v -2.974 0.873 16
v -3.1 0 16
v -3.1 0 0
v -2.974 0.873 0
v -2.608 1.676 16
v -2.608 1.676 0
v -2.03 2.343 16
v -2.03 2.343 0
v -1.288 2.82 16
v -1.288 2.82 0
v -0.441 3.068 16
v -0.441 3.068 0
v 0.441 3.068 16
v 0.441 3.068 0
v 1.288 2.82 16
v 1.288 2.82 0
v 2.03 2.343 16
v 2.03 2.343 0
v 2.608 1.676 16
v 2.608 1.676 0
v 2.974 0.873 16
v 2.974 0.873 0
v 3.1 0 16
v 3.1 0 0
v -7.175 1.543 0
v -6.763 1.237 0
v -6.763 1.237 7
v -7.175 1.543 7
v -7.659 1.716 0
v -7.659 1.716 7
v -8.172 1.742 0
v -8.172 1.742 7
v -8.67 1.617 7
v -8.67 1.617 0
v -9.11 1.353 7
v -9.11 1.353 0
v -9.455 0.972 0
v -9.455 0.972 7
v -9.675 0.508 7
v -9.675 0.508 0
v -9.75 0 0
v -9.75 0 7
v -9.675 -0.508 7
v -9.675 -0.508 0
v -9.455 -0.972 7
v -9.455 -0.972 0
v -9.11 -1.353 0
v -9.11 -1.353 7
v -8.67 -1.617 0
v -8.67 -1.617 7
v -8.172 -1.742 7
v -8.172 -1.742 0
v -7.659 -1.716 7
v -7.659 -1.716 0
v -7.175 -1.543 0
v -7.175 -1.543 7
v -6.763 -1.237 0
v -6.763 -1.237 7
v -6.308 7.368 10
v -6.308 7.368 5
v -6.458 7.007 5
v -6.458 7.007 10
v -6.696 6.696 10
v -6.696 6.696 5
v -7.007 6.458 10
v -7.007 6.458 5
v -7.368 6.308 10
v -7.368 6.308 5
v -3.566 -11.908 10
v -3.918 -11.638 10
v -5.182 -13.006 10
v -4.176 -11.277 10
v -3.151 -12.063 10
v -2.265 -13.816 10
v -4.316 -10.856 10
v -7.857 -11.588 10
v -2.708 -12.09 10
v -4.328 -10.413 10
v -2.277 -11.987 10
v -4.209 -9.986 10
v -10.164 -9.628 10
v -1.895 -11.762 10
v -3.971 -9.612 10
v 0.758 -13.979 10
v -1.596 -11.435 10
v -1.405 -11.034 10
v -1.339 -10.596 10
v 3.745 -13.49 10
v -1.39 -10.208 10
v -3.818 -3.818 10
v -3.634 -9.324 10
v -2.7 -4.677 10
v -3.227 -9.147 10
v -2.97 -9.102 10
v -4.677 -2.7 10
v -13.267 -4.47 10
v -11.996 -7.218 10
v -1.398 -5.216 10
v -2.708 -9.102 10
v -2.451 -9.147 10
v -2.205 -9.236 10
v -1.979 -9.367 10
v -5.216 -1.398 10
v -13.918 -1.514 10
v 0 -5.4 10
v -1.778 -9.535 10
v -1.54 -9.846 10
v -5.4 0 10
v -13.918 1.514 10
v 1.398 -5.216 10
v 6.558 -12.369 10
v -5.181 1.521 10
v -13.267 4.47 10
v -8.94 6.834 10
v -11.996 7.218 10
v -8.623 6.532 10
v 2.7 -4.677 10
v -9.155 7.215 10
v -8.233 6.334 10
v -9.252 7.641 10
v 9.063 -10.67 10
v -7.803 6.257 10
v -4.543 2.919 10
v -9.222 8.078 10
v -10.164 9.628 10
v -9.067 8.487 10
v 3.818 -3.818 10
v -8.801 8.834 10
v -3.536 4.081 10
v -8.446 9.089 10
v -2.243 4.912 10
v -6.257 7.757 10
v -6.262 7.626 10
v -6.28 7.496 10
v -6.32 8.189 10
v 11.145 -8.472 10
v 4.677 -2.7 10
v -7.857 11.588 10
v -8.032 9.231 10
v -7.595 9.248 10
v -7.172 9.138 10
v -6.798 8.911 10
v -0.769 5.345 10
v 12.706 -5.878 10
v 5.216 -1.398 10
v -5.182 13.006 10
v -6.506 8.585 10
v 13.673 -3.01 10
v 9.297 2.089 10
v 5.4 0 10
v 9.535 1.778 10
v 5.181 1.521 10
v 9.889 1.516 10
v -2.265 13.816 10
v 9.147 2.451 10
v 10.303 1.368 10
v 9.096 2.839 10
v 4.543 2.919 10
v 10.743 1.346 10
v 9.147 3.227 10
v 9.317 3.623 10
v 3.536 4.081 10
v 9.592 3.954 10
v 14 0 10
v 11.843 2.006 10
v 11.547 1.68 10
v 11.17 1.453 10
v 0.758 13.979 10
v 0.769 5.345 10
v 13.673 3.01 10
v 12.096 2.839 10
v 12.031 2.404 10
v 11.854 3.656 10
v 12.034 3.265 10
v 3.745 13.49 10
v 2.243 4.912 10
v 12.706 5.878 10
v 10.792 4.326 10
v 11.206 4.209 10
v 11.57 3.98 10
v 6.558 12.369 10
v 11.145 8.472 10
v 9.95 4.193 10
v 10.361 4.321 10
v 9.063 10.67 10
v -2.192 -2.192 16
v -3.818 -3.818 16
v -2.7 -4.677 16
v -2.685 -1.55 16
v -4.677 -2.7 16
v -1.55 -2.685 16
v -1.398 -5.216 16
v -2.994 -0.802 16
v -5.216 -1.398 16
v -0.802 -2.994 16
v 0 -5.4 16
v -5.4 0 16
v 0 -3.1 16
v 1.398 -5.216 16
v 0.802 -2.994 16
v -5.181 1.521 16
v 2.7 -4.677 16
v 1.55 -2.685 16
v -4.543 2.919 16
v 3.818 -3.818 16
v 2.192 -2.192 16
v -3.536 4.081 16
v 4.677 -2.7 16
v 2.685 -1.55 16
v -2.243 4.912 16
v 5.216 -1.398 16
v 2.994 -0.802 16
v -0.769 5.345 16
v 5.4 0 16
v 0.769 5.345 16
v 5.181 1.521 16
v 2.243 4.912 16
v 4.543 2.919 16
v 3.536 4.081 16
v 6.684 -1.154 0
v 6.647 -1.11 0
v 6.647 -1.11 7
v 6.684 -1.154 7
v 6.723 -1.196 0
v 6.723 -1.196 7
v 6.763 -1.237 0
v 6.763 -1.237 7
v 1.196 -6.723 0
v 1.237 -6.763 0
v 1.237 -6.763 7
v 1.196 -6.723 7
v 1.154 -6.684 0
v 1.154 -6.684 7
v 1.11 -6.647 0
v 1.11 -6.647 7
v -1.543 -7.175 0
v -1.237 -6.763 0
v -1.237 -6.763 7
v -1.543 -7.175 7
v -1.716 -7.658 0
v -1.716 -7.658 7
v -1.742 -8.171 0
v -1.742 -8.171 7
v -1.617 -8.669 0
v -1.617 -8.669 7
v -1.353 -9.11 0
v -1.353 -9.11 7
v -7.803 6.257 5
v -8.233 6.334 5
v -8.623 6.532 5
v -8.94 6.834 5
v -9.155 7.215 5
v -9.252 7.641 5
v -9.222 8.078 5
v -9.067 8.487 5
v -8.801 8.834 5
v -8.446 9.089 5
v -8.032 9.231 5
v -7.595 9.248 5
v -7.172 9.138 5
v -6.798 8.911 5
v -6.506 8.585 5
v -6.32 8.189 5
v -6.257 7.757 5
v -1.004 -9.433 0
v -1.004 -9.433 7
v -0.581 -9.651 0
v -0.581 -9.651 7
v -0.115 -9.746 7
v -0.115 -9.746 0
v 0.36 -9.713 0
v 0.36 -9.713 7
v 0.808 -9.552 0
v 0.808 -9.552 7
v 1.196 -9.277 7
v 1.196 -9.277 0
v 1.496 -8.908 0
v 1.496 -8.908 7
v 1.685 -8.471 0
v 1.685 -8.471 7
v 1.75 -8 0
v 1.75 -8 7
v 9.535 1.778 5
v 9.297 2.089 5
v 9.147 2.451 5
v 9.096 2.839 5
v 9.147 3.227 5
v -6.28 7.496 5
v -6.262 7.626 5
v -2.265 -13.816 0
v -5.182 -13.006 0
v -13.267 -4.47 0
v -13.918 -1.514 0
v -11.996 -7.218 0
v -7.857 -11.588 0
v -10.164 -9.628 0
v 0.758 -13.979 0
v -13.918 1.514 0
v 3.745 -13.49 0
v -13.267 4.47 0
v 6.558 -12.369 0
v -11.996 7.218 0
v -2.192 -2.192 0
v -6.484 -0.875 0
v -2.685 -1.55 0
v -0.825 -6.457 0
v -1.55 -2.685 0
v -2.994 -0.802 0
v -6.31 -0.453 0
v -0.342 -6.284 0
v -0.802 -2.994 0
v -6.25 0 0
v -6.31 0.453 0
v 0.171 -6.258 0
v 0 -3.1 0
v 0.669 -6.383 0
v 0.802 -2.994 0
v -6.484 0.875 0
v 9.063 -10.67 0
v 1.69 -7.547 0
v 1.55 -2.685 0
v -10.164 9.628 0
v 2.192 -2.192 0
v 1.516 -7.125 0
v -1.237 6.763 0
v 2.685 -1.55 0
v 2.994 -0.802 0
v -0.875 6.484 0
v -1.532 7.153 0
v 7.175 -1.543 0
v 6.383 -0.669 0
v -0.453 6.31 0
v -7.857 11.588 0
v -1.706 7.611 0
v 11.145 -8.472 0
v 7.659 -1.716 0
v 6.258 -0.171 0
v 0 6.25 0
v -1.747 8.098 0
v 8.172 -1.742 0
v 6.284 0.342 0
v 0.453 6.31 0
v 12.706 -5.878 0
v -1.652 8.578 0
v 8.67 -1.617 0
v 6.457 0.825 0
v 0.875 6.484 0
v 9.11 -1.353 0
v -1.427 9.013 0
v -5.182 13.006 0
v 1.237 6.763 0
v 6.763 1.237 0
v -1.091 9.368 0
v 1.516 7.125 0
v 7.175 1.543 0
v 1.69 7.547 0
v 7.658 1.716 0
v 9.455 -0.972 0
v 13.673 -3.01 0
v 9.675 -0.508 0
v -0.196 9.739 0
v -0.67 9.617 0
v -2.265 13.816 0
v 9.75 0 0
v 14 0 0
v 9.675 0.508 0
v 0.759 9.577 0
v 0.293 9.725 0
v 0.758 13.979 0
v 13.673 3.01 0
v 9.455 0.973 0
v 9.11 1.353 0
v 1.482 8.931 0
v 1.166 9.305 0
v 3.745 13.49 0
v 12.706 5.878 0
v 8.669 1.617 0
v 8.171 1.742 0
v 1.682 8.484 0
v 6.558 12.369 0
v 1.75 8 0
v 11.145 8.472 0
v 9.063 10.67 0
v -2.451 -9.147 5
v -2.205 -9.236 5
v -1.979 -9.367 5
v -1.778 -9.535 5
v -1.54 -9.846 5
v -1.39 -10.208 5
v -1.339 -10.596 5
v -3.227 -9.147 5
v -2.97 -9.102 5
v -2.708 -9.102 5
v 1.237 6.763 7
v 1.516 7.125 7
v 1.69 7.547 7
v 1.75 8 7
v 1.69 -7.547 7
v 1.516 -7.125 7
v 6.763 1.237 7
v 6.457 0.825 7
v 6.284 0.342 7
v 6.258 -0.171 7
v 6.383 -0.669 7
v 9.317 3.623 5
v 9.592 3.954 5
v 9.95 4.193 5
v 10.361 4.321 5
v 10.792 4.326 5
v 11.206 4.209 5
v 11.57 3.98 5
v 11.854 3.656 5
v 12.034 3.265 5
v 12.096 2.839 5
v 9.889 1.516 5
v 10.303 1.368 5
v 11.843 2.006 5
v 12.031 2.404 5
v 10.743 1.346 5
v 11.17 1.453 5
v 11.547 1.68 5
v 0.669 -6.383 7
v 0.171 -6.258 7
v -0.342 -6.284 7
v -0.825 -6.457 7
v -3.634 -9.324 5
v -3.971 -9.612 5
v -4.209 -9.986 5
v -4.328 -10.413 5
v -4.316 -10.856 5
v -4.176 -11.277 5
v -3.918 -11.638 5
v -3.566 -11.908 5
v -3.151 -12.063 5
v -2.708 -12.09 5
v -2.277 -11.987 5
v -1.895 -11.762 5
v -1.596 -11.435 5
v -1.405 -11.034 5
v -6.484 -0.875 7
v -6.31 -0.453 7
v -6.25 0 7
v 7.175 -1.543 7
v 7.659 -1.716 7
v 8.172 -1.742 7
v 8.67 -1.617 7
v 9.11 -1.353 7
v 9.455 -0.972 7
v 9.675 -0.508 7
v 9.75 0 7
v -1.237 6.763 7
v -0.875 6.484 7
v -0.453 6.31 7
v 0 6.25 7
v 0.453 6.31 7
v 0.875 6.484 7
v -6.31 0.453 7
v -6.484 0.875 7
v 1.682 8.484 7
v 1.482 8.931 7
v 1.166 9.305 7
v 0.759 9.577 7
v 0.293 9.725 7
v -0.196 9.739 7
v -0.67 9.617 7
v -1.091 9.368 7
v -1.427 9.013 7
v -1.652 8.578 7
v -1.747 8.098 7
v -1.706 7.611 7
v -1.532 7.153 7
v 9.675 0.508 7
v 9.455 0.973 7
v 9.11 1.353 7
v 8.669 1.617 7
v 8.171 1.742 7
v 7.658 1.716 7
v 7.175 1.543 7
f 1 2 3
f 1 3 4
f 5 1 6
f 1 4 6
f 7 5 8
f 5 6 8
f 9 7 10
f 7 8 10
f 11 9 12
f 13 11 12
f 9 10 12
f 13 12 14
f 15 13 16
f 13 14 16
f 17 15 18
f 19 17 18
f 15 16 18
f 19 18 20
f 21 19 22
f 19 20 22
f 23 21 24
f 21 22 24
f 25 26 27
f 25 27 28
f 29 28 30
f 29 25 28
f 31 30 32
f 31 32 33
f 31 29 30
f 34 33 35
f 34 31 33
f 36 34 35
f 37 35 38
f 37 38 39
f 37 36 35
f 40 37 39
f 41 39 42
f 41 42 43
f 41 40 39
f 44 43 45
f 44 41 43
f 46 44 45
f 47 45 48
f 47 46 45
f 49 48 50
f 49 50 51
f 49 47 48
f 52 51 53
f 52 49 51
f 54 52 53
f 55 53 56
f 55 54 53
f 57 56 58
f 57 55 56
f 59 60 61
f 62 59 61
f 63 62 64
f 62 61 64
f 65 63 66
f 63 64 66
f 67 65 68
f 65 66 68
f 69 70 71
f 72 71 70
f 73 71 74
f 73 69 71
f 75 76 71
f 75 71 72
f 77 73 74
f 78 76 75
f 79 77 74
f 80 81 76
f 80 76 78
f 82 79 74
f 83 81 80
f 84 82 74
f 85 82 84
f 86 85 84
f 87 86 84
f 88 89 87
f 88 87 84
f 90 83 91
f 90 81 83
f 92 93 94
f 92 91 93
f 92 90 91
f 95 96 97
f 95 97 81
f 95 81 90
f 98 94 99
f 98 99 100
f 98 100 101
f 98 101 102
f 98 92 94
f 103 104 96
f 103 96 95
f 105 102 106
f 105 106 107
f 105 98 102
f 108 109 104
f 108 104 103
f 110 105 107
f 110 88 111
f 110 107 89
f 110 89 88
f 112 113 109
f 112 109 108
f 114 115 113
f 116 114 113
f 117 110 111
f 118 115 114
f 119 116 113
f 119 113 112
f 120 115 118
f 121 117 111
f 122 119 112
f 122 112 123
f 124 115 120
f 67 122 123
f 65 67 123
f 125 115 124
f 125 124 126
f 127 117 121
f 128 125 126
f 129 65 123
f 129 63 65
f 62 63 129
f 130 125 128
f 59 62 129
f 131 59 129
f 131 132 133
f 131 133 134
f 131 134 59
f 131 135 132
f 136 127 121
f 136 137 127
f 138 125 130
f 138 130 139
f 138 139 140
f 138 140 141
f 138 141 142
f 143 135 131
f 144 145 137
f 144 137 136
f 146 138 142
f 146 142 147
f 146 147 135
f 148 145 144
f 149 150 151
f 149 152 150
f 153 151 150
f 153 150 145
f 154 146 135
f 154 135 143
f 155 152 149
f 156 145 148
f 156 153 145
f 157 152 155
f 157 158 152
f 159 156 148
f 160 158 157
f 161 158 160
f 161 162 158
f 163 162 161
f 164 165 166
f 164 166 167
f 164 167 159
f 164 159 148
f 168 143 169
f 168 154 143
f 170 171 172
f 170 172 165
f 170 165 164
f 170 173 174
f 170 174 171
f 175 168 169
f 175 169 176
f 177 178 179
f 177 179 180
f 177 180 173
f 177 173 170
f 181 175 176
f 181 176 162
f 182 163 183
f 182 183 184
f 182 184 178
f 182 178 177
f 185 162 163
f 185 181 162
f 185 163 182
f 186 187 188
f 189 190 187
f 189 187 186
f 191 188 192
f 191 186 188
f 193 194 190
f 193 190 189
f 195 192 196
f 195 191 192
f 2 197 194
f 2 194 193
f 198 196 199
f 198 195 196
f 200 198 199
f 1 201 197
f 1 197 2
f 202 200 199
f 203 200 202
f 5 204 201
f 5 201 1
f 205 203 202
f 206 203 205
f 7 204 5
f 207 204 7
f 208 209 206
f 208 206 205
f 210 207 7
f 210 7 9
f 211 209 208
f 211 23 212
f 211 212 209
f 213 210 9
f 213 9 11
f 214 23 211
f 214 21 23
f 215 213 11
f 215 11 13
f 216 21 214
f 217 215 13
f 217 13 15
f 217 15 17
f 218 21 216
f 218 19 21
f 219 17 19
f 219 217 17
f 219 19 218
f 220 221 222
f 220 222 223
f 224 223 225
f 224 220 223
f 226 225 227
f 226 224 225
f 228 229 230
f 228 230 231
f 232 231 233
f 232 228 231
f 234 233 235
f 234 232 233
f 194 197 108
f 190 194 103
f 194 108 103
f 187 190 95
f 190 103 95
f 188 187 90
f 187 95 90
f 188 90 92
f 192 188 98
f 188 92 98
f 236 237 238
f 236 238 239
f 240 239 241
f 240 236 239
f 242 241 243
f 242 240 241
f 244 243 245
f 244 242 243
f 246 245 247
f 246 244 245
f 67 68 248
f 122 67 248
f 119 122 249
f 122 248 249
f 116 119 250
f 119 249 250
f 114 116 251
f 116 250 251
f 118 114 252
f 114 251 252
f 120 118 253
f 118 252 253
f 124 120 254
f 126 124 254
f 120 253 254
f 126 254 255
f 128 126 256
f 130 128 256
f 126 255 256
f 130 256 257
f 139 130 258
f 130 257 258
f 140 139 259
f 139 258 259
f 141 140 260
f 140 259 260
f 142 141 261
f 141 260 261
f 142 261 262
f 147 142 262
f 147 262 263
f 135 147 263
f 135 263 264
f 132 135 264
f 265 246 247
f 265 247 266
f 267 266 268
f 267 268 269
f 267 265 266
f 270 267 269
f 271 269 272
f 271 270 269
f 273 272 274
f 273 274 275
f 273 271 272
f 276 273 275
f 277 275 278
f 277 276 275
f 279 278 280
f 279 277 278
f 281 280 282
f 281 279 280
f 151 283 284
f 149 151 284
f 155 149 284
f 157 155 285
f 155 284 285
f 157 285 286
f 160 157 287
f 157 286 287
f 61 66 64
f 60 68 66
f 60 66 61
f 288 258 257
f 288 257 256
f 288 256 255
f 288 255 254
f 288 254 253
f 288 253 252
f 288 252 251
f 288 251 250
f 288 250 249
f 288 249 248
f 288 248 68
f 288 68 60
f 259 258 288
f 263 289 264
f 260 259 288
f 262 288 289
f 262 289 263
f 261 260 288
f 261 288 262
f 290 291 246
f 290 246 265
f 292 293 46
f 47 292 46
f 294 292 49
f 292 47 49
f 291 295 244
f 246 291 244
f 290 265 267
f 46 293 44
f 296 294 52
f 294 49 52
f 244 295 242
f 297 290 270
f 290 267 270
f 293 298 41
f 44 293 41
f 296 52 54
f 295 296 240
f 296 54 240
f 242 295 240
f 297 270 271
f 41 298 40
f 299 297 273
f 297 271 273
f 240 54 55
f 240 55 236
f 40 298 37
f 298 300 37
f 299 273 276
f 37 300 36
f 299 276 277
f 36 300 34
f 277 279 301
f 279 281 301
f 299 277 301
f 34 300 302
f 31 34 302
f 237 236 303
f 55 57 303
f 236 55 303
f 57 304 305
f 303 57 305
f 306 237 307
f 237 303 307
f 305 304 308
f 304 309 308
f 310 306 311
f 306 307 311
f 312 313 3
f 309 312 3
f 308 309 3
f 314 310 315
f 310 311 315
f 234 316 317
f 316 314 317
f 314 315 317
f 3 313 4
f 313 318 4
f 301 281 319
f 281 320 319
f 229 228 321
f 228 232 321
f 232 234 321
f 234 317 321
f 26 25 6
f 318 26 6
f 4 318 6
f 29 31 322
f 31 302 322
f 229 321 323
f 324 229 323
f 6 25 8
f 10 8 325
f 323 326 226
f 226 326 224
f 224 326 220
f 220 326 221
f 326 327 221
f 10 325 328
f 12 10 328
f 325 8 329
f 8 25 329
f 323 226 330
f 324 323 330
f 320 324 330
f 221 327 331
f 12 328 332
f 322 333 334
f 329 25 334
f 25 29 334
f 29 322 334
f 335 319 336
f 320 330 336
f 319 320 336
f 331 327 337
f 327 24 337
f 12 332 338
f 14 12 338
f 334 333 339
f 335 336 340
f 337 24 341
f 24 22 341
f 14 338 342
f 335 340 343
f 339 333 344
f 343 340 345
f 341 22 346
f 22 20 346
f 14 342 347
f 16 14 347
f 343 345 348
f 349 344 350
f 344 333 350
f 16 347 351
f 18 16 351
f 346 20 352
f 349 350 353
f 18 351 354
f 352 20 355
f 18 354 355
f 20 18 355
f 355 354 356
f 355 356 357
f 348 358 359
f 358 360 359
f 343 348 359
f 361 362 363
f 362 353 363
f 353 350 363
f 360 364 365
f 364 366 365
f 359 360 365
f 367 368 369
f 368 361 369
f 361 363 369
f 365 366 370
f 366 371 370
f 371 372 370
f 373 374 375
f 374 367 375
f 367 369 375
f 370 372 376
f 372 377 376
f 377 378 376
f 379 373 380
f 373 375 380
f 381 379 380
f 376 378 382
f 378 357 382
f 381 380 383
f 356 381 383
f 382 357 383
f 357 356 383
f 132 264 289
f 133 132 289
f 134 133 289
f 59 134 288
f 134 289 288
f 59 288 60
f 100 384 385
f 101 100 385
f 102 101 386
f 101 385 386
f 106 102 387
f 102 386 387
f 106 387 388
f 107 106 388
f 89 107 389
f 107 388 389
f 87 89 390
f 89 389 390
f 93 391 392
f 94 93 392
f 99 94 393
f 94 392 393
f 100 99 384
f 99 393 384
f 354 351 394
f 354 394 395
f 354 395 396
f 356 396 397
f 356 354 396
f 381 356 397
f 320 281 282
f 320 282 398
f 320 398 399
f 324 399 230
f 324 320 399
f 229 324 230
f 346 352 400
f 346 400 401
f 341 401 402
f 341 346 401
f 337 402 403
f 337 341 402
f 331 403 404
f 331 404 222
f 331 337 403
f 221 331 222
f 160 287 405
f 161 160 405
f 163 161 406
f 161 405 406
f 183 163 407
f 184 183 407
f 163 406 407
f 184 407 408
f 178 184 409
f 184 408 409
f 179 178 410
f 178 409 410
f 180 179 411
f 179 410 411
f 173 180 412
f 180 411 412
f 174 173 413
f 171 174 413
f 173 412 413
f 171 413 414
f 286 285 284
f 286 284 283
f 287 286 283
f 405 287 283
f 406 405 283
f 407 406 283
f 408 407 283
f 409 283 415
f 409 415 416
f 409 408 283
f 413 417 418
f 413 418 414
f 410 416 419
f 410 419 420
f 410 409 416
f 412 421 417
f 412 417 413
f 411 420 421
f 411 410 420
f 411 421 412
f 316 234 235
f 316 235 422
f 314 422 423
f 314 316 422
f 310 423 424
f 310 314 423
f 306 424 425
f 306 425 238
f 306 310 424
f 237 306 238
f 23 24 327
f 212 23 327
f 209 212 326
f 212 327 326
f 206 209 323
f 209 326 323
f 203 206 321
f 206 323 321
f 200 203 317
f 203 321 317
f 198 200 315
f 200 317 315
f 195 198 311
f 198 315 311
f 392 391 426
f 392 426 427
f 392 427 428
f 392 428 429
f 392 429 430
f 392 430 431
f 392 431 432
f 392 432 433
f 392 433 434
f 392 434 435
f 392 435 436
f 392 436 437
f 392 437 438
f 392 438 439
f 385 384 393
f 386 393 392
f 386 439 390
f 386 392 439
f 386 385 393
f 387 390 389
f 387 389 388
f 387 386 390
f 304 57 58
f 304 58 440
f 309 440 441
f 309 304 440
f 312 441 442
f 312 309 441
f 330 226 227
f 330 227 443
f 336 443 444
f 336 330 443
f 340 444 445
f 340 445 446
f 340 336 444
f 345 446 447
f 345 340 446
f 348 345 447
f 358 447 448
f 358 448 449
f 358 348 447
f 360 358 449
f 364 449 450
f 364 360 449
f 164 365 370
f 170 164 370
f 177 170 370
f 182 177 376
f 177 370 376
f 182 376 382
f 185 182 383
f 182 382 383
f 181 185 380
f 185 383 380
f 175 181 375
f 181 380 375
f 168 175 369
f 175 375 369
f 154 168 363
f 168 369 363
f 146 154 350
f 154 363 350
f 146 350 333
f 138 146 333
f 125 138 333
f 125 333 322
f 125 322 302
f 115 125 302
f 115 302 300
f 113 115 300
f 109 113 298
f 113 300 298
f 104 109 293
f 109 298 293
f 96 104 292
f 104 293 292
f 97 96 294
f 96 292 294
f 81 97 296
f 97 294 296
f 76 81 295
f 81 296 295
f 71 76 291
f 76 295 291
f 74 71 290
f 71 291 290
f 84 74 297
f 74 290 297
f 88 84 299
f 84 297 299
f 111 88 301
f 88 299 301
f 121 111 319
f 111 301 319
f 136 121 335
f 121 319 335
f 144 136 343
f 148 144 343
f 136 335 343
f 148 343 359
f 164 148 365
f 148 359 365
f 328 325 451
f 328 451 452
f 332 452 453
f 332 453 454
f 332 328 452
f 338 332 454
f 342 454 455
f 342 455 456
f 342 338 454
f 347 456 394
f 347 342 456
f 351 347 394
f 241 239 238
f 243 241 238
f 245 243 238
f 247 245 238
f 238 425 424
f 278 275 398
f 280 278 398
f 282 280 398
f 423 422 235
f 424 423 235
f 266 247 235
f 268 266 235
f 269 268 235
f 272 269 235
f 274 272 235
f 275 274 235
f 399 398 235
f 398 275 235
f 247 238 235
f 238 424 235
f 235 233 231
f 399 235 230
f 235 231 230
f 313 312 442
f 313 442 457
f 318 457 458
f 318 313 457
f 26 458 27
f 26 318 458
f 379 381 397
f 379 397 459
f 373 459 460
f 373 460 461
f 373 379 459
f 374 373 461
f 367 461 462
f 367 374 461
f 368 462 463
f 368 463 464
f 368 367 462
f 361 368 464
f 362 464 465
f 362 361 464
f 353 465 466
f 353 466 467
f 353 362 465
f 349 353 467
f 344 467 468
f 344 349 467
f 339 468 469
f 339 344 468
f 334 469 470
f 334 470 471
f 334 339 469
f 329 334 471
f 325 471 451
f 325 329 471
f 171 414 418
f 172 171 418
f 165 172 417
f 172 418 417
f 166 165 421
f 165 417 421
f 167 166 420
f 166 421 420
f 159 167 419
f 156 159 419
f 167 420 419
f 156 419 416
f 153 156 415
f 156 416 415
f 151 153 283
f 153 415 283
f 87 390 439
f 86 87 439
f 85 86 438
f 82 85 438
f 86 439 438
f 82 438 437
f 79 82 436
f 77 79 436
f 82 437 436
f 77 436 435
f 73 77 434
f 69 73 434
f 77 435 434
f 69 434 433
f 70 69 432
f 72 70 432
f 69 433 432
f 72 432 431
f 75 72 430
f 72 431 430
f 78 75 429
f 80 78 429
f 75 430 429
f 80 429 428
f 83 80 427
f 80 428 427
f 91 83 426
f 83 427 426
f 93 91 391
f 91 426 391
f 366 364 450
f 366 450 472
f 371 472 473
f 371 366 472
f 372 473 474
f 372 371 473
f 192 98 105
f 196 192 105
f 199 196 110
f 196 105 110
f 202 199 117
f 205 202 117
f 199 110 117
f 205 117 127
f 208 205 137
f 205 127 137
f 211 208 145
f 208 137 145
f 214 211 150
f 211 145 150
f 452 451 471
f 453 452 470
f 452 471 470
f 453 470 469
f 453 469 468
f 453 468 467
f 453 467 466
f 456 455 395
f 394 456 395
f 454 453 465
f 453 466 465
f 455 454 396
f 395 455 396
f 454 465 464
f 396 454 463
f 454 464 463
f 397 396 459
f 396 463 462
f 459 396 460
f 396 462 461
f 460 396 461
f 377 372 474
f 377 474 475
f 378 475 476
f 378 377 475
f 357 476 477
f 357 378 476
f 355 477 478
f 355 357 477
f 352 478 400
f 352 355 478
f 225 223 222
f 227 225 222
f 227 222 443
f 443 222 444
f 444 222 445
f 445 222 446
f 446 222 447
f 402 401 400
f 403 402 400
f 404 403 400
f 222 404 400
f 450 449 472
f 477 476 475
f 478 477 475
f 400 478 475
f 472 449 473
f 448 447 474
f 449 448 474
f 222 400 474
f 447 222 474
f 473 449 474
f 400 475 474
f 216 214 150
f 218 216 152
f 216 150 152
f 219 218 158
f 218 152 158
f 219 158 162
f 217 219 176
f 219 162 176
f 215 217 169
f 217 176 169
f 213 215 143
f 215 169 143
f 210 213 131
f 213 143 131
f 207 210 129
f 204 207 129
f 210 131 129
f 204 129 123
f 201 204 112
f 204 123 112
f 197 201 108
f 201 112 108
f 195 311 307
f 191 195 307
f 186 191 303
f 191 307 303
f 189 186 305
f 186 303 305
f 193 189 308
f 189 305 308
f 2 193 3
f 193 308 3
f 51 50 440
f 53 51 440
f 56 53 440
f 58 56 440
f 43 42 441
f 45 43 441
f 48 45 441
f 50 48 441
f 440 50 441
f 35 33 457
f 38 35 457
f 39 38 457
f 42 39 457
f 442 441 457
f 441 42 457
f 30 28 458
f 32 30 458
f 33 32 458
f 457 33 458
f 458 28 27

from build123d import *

# Parameters (mm, degrees)
F0_R     = 14
F1_DEPTH = 10
F2_DEPTH = 16
F3_DEPTH = 5
F4_DEPTH = 7


with BuildPart() as f1:
    # F0 (on Top) → F1 (new body)
    with BuildSketch(Plane.XY):
        Circle(F0_R)
        with BuildLine():
            Line((-3.2273842295, -9.1469844412), (-4.8285142885, -3.1714857115))
            Line((-4.8285142885, -3.1714857115), (-6.7625631329, -1.2374368671))
            ThreePointArc((-6.7625631329, -1.2374368671), (-9.75, 0), (-6.7625631329, 1.2374368671))
            Line((-6.7625631329, 1.2374368671), (-6.1689418708, 1.8310581292))
            Line((-6.1689418708, 1.8310581292), (-7.3684889512, 6.3078287794))
            ThreePointArc((-7.3684889512, 6.3078287794), (-8.9467475293, 8.6698596623), (-6.2567175188, 7.7567175188))
            ThreePointArc((-6.2567175188, 7.7567175188), (-6.2695502268, 7.5609282305), (-6.3078287794, 7.3684889512))
            Line((-6.3078287794, 7.3684889512), (-1.8310581292, 6.1689418708))
            Line((-1.8310581292, 6.1689418708), (-1.2374368671, 6.7625631329))
            ThreePointArc((-1.2374368671, 6.7625631329), (-0.6696960066, 9.6167891819), (1.75, 8))
            ThreePointArc((1.75, 8), (1.6167891819, 7.3303039934), (1.2374368671, 6.7625631329))
            Line((1.2374368671, 6.7625631329), (3.1714857115, 4.8285142885))
            Line((3.1714857115, 4.8285142885), (9.1469844412, 3.2273842295))
            ThreePointArc((9.1469844412, 3.2273842295), (10.791662469, 4.3263229539), (12.0958731807, 2.8391556619))
            ThreePointArc((12.0958731807, 2.8391556619), (11.1698983292, 1.4533363631), (9.5352130089, 1.7784954901))
            Line((9.5352130089, 1.7784954901), (9.1098023873, 1.3530848684))
            ThreePointArc((9.1098023873, 1.3530848684), (9.581874549, 0.7484469996), (9.75, 0))
            ThreePointArc((9.75, 0), (8.6696960066, -1.6167891819), (6.7625631329, -1.2374368671))
            Line((6.7625631329, -1.2374368671), (1.2374368671, -6.7625631329))
            ThreePointArc((1.2374368671, -6.7625631329), (1.6167891819, -7.3303039934), (1.75, -8))
            ThreePointArc((1.75, -8), (0.5893222719, -9.6477861693), (-1.3530848684, -9.1098023873))
            Line((-1.3530848684, -9.1098023873), (-1.7784954901, -9.5352130089))
            ThreePointArc((-1.7784954901, -9.5352130089), (-1.4533363631, -10.0218480321), (-1.3391556619, -10.5958731807))
            ThreePointArc((-1.3391556619, -10.5958731807), (-3.7522978054, -11.7859031911), (-3.2273842295, -9.1469844412))
        make_face(mode=Mode.SUBTRACT)
        with BuildLine():
            Line((-5.6783113237, 0), (-5.4, 0))
            ThreePointArc((-5.4, 0), (0, 5.4), (5.4, 0))
            ThreePointArc((5.4, 0), (3.2873117166, -4.2841080376), (-1.3976228436, -5.215999462))
            Line((-1.3976228436, -5.215999462), (-1.6905989232, -6.3094010768))
            Line((-1.6905989232, -6.3094010768), (-1.2374368671, -6.7625631329))
            ThreePointArc((-1.2374368671, -6.7625631329), (-0.0861176821, -6.2521202144), (1.1098023873, -6.6469151316))
            Line((1.1098023873, -6.6469151316), (6.6469151316, -1.1098023873))
            ThreePointArc((6.6469151316, -1.1098023873), (6.2521202144, 0.0861176821), (6.7625631329, 1.2374368671))
            Line((6.7625631329, 1.2374368671), (3.1714857115, 4.8285142885))
            Line((3.1714857115, 4.8285142885), (-1.8310581292, 6.1689418708))
            Line((-1.8310581292, 6.1689418708), (-6.1689418708, 1.8310581292))
            Line((-6.1689418708, 1.8310581292), (-5.6783113237, 0))
        make_face()
        with BuildLine():
            Line((6.6469151316, -1.1098023873), (1.1098023873, -6.6469151316))
            ThreePointArc((1.1098023873, -6.6469151316), (1.1750432521, -6.7031679539), (1.2374368671, -6.7625631329))
            Line((1.2374368671, -6.7625631329), (6.7625631329, -1.2374368671))
            ThreePointArc((6.7625631329, -1.2374368671), (6.7031679539, -1.1750432521), (6.6469151316, -1.1098023873))
        make_face()
        with BuildLine():
            Line((9.1469844412, 3.2273842295), (3.1714857115, 4.8285142885))
            Line((3.1714857115, 4.8285142885), (6.7625631329, 1.2374368671))
            ThreePointArc((6.7625631329, 1.2374368671), (7.9138823179, 1.7478797856), (9.1098023873, 1.3530848684))
            Line((9.1098023873, 1.3530848684), (9.5352130089, 1.7784954901))
            ThreePointArc((9.5352130089, 1.7784954901), (9.1469844412, 2.4509270942), (9.1469844412, 3.2273842295))
        make_face()
        with BuildLine():
            Line((-1.2374368671, 6.7625631329), (-1.8310581292, 6.1689418708))
            Line((-1.8310581292, 6.1689418708), (3.1714857115, 4.8285142885))
            Line((3.1714857115, 4.8285142885), (1.2374368671, 6.7625631329))
            ThreePointArc((1.2374368671, 6.7625631329), (0, 6.25), (-1.2374368671, 6.7625631329))
        make_face()
        with BuildLine():
            Line((-7.3684889512, 6.3078287794), (-6.1689418708, 1.8310581292))
            Line((-6.1689418708, 1.8310581292), (-1.8310581292, 6.1689418708))
            Line((-1.8310581292, 6.1689418708), (-6.3078287794, 7.3684889512))
            ThreePointArc((-6.3078287794, 7.3684889512), (-6.696057347, 6.696057347), (-7.3684889512, 6.3078287794))
        make_face()
        with BuildLine():
            Line((-4.8285142885, -3.1714857115), (-5.6783113237, 0))
            Line((-5.6783113237, 0), (-6.25, 0))
            ThreePointArc((-6.25, 0), (-6.3832108181, -0.6696960066), (-6.7625631329, -1.2374368671))
            Line((-6.7625631329, -1.2374368671), (-4.8285142885, -3.1714857115))
        make_face()
        with BuildLine():
            Line((-6.25, 0), (-5.6783113237, 0))
            Line((-5.6783113237, 0), (-6.1689418708, 1.8310581292))
            Line((-6.1689418708, 1.8310581292), (-6.7625631329, 1.2374368671))
            ThreePointArc((-6.7625631329, 1.2374368671), (-6.3832108181, 0.6696960066), (-6.25, 0))
        make_face()
        with BuildLine():
            Line((-2.4509270942, -9.1469844412), (-1.6905989232, -6.3094010768))
            Line((-1.6905989232, -6.3094010768), (-4.8285142885, -3.1714857115))
            Line((-4.8285142885, -3.1714857115), (-3.2273842295, -9.1469844412))
            ThreePointArc((-3.2273842295, -9.1469844412), (-2.8391556619, -9.0958731807), (-2.4509270942, -9.1469844412))
        make_face()
        with BuildLine():
            Line((-1.2374368671, -6.7625631329), (-1.6905989232, -6.3094010768))
            Line((-1.6905989232, -6.3094010768), (-2.4509270942, -9.1469844412))
            ThreePointArc((-2.4509270942, -9.1469844412), (-2.0891556619, -9.296835075), (-1.7784954901, -9.5352130089))
            Line((-1.7784954901, -9.5352130089), (-1.3530848684, -9.1098023873))
            ThreePointArc((-1.3530848684, -9.1098023873), (-1.7478797856, -7.9138823179), (-1.2374368671, -6.7625631329))
        make_face()
        with BuildLine():
            ThreePointArc((-1.3976228436, -5.215999462), (-4.2841080376, -3.2873117166), (-5.4, 0))
            Line((-5.4, 0), (-5.6783113237, 0))
            Line((-5.6783113237, 0), (-4.8285142885, -3.1714857115))
            Line((-4.8285142885, -3.1714857115), (-1.6905989232, -6.3094010768))
            Line((-1.6905989232, -6.3094010768), (-1.3976228436, -5.215999462))
        make_face()
        with BuildLine():
            Line((-8, 0), (-6.25, 0))
            ThreePointArc((-6.25, 0), (-6.3832108181, 0.6696960066), (-6.7625631329, 1.2374368671))
            Line((-6.7625631329, 1.2374368671), (-8, 0))
        make_face()
        with BuildLine():
            ThreePointArc((-6.7625631329, -1.2374368671), (-6.3832108181, -0.6696960066), (-6.25, 0))
            Line((-6.25, 0), (-8, 0))
            Line((-8, 0), (-6.7625631329, -1.2374368671))
        make_face()
        with BuildLine():
            ThreePointArc((-6.7625631329, 1.2374368671), (-9.75, 0), (-6.7625631329, -1.2374368671))
            Line((-6.7625631329, -1.2374368671), (-8, 0))
            Line((-8, 0), (-6.7625631329, 1.2374368671))
        make_face()
        with BuildLine():
            ThreePointArc((1.75, 8), (-0.6696960066, 9.6167891819), (-1.2374368671, 6.7625631329))
            Line((-1.2374368671, 6.7625631329), (0, 8))
            Line((0, 8), (1.2374368671, 6.7625631329))
            ThreePointArc((1.2374368671, 6.7625631329), (1.6167891819, 7.3303039934), (1.75, 8))
        make_face()
        with BuildLine():
            Line((0, 8), (-1.2374368671, 6.7625631329))
            ThreePointArc((-1.2374368671, 6.7625631329), (0, 6.25), (1.2374368671, 6.7625631329))
            Line((1.2374368671, 6.7625631329), (0, 8))
        make_face()
        with BuildLine():
            Line((9.1098023873, 1.3530848684), (7.8783587594, 0.1216412406))
            Line((7.8783587594, 0.1216412406), (8, 0))
            Line((8, 0), (6.7625631329, -1.2374368671))
            ThreePointArc((6.7625631329, -1.2374368671), (8.6696960066, -1.6167891819), (9.75, 0))
            ThreePointArc((9.75, 0), (9.581874549, 0.7484469996), (9.1098023873, 1.3530848684))
        make_face()
        with BuildLine():
            ThreePointArc((6.7625631329, 1.2374368671), (6.2521202144, 0.0861176821), (6.6469151316, -1.1098023873))
            Line((6.6469151316, -1.1098023873), (7.8783587594, 0.1216412406))
            Line((7.8783587594, 0.1216412406), (6.7625631329, 1.2374368671))
        make_face()
        with BuildLine():
            Line((0, -8), (-0.1216412406, -7.8783587594))
            Line((-0.1216412406, -7.8783587594), (-1.3530848684, -9.1098023873))
            ThreePointArc((-1.3530848684, -9.1098023873), (0.5893222719, -9.6477861693), (1.75, -8))
            ThreePointArc((1.75, -8), (1.6167891819, -7.3303039934), (1.2374368671, -6.7625631329))
            Line((1.2374368671, -6.7625631329), (0, -8))
        make_face()
        with BuildLine():
            ThreePointArc((1.1098023873, -6.6469151316), (-0.0861176821, -6.2521202144), (-1.2374368671, -6.7625631329))
            Line((-1.2374368671, -6.7625631329), (-0.1216412406, -7.8783587594))
            Line((-0.1216412406, -7.8783587594), (1.1098023873, -6.6469151316))
        make_face()
        with BuildLine():
            Line((-0.1216412406, -7.8783587594), (-1.2374368671, -6.7625631329))
            ThreePointArc((-1.2374368671, -6.7625631329), (-1.7478797856, -7.9138823179), (-1.3530848684, -9.1098023873))
            Line((-1.3530848684, -9.1098023873), (-0.1216412406, -7.8783587594))
        make_face()
        with BuildLine():
            Line((1.1098023873, -6.6469151316), (-0.1216412406, -7.8783587594))
            Line((-0.1216412406, -7.8783587594), (0, -8))
            Line((0, -8), (1.2374368671, -6.7625631329))
            ThreePointArc((1.2374368671, -6.7625631329), (1.1750432521, -6.7031679539), (1.1098023873, -6.6469151316))
        make_face()
        with BuildLine():
            ThreePointArc((9.1098023873, 1.3530848684), (7.9138823179, 1.7478797856), (6.7625631329, 1.2374368671))
            Line((6.7625631329, 1.2374368671), (7.8783587594, 0.1216412406))
            Line((7.8783587594, 0.1216412406), (9.1098023873, 1.3530848684))
        make_face()
        with BuildLine():
            Line((7.8783587594, 0.1216412406), (6.6469151316, -1.1098023873))
            ThreePointArc((6.6469151316, -1.1098023873), (6.7031679539, -1.1750432521), (6.7625631329, -1.2374368671))
            Line((6.7625631329, -1.2374368671), (8, 0))
            Line((8, 0), (7.8783587594, 0.1216412406))
        make_face()
    extrude(amount=F1_DEPTH)

    # F0 (on Top) → F2 (join)
    with BuildSketch(Plane.XY):
        with BuildLine():
            ThreePointArc((-0.8023390398, -2.9943700615), (-2.4593953549, -1.8871604299), (-3.1, 0))
            Line((-3.1, 0), (-5.4, 0))
            ThreePointArc((-5.4, 0), (-4.2841080376, -3.2873117166), (-1.3976228436, -5.215999462))
            Line((-1.3976228436, -5.215999462), (-0.8023390398, -2.9943700615))
        make_face()
        with BuildLine():
            ThreePointArc((-3.1, 0), (0, 3.1), (3.1, 0))
            ThreePointArc((3.1, 0), (1.8871604299, -2.4593953549), (-0.8023390398, -2.9943700615))
            Line((-0.8023390398, -2.9943700615), (-1.3976228436, -5.215999462))
            ThreePointArc((-1.3976228436, -5.215999462), (3.2873117166, -4.2841080376), (5.4, 0))
            ThreePointArc((5.4, 0), (0, 5.4), (-5.4, 0))
            Line((-5.4, 0), (-3.1, 0))
        make_face()
    extrude(amount=F2_DEPTH)

    # F0 (on Top) → F3 (join)
    with BuildSketch(Plane.XY):
        with BuildLine():
            ThreePointArc((-1.7784954901, -9.5352130089), (-2.0891556619, -9.296835075), (-2.4509270942, -9.1469844412))
            Line((-2.4509270942, -9.1469844412), (-2.8391556619, -10.5958731807))
            Line((-2.8391556619, -10.5958731807), (-1.7784954901, -9.5352130089))
        make_face()
        with BuildLine():
            Line((-2.8391556619, -10.5958731807), (-2.4509270942, -9.1469844412))
            ThreePointArc((-2.4509270942, -9.1469844412), (-2.8391556619, -9.0958731807), (-3.2273842295, -9.1469844412))
            Line((-3.2273842295, -9.1469844412), (-2.8391556619, -10.5958731807))
        make_face()
        with BuildLine():
            Line((-2.8391556619, -10.5958731807), (-3.2273842295, -9.1469844412))
            ThreePointArc((-3.2273842295, -9.1469844412), (-3.7522978054, -11.7859031911), (-1.3391556619, -10.5958731807))
            ThreePointArc((-1.3391556619, -10.5958731807), (-1.4533363631, -10.0218480321), (-1.7784954901, -9.5352130089))
            Line((-1.7784954901, -9.5352130089), (-2.8391556619, -10.5958731807))
        make_face()
        with BuildLine():
            Line((10.5958731807, 2.8391556619), (9.1469844412, 3.2273842295))
            ThreePointArc((9.1469844412, 3.2273842295), (9.1469844412, 2.4509270942), (9.5352130089, 1.7784954901))
            Line((9.5352130089, 1.7784954901), (10.5958731807, 2.8391556619))
        make_face()
        with BuildLine():
            ThreePointArc((12.0958731807, 2.8391556619), (10.791662469, 4.3263229539), (9.1469844412, 3.2273842295))
            Line((9.1469844412, 3.2273842295), (10.5958731807, 2.8391556619))
            Line((10.5958731807, 2.8391556619), (9.5352130089, 1.7784954901))
            ThreePointArc((9.5352130089, 1.7784954901), (11.1698983292, 1.4533363631), (12.0958731807, 2.8391556619))
        make_face()
        with BuildLine():
            ThreePointArc((-6.2567175188, 7.7567175188), (-8.9467475293, 8.6698596623), (-7.3684889512, 6.3078287794))
            Line((-7.3684889512, 6.3078287794), (-7.7567175188, 7.7567175188))
            Line((-7.7567175188, 7.7567175188), (-6.3078287794, 7.3684889512))
            ThreePointArc((-6.3078287794, 7.3684889512), (-6.2695502268, 7.5609282305), (-6.2567175188, 7.7567175188))
        make_face()
        with BuildLine():
            Line((-7.7567175188, 7.7567175188), (-7.3684889512, 6.3078287794))
            ThreePointArc((-7.3684889512, 6.3078287794), (-6.696057347, 6.696057347), (-6.3078287794, 7.3684889512))
            Line((-6.3078287794, 7.3684889512), (-7.7567175188, 7.7567175188))
        make_face()
    extrude(amount=F3_DEPTH)

    # F0 (on Top) → F4 (cut)
    with BuildSketch(Plane.XY):
        with BuildLine():
            ThreePointArc((1.75, 8), (-0.6696960066, 9.6167891819), (-1.2374368671, 6.7625631329))
            Line((-1.2374368671, 6.7625631329), (0, 8))
            Line((0, 8), (1.2374368671, 6.7625631329))
            ThreePointArc((1.2374368671, 6.7625631329), (1.6167891819, 7.3303039934), (1.75, 8))
        make_face()
        with BuildLine():
            Line((0, 8), (-1.2374368671, 6.7625631329))
            ThreePointArc((-1.2374368671, 6.7625631329), (0, 6.25), (1.2374368671, 6.7625631329))
            Line((1.2374368671, 6.7625631329), (0, 8))
        make_face()
        with BuildLine():
            ThreePointArc((-6.7625631329, 1.2374368671), (-9.75, 0), (-6.7625631329, -1.2374368671))
            Line((-6.7625631329, -1.2374368671), (-8, 0))
            Line((-8, 0), (-6.7625631329, 1.2374368671))
        make_face()
        with BuildLine():
            ThreePointArc((-6.7625631329, -1.2374368671), (-6.3832108181, -0.6696960066), (-6.25, 0))
            Line((-6.25, 0), (-8, 0))
            Line((-8, 0), (-6.7625631329, -1.2374368671))
        make_face()
        with BuildLine():
            Line((-8, 0), (-6.25, 0))
            ThreePointArc((-6.25, 0), (-6.3832108181, 0.6696960066), (-6.7625631329, 1.2374368671))
            Line((-6.7625631329, 1.2374368671), (-8, 0))
        make_face()
        with BuildLine():
            ThreePointArc((1.1098023873, -6.6469151316), (-0.0861176821, -6.2521202144), (-1.2374368671, -6.7625631329))
            Line((-1.2374368671, -6.7625631329), (-0.1216412406, -7.8783587594))
            Line((-0.1216412406, -7.8783587594), (1.1098023873, -6.6469151316))
        make_face()
        with BuildLine():
            Line((-0.1216412406, -7.8783587594), (-1.2374368671, -6.7625631329))
            ThreePointArc((-1.2374368671, -6.7625631329), (-1.7478797856, -7.9138823179), (-1.3530848684, -9.1098023873))
            Line((-1.3530848684, -9.1098023873), (-0.1216412406, -7.8783587594))
        make_face()
        with BuildLine():
            Line((1.1098023873, -6.6469151316), (-0.1216412406, -7.8783587594))
            Line((-0.1216412406, -7.8783587594), (0, -8))
            Line((0, -8), (1.2374368671, -6.7625631329))
            ThreePointArc((1.2374368671, -6.7625631329), (1.1750432521, -6.7031679539), (1.1098023873, -6.6469151316))
        make_face()
        with BuildLine():
            Line((0, -8), (-0.1216412406, -7.8783587594))
            Line((-0.1216412406, -7.8783587594), (-1.3530848684, -9.1098023873))
            ThreePointArc((-1.3530848684, -9.1098023873), (0.5893222719, -9.6477861693), (1.75, -8))
            ThreePointArc((1.75, -8), (1.6167891819, -7.3303039934), (1.2374368671, -6.7625631329))
            Line((1.2374368671, -6.7625631329), (0, -8))
        make_face()
        with BuildLine():
            ThreePointArc((9.1098023873, 1.3530848684), (7.9138823179, 1.7478797856), (6.7625631329, 1.2374368671))
            Line((6.7625631329, 1.2374368671), (7.8783587594, 0.1216412406))
            Line((7.8783587594, 0.1216412406), (9.1098023873, 1.3530848684))
        make_face()
        with BuildLine():
            ThreePointArc((6.7625631329, 1.2374368671), (6.2521202144, 0.0861176821), (6.6469151316, -1.1098023873))
            Line((6.6469151316, -1.1098023873), (7.8783587594, 0.1216412406))
            Line((7.8783587594, 0.1216412406), (6.7625631329, 1.2374368671))
        make_face()
        with BuildLine():
            Line((9.1098023873, 1.3530848684), (7.8783587594, 0.1216412406))
            Line((7.8783587594, 0.1216412406), (8, 0))
            Line((8, 0), (6.7625631329, -1.2374368671))
            ThreePointArc((6.7625631329, -1.2374368671), (8.6696960066, -1.6167891819), (9.75, 0))
            ThreePointArc((9.75, 0), (9.581874549, 0.7484469996), (9.1098023873, 1.3530848684))
        make_face()
        with BuildLine():
            Line((7.8783587594, 0.1216412406), (6.6469151316, -1.1098023873))
            ThreePointArc((6.6469151316, -1.1098023873), (6.7031679539, -1.1750432521), (6.7625631329, -1.2374368671))
            Line((6.7625631329, -1.2374368671), (8, 0))
            Line((8, 0), (7.8783587594, 0.1216412406))
        make_face()
    extrude(amount=F4_DEPTH, mode=Mode.SUBTRACT)


solid = f1.part
